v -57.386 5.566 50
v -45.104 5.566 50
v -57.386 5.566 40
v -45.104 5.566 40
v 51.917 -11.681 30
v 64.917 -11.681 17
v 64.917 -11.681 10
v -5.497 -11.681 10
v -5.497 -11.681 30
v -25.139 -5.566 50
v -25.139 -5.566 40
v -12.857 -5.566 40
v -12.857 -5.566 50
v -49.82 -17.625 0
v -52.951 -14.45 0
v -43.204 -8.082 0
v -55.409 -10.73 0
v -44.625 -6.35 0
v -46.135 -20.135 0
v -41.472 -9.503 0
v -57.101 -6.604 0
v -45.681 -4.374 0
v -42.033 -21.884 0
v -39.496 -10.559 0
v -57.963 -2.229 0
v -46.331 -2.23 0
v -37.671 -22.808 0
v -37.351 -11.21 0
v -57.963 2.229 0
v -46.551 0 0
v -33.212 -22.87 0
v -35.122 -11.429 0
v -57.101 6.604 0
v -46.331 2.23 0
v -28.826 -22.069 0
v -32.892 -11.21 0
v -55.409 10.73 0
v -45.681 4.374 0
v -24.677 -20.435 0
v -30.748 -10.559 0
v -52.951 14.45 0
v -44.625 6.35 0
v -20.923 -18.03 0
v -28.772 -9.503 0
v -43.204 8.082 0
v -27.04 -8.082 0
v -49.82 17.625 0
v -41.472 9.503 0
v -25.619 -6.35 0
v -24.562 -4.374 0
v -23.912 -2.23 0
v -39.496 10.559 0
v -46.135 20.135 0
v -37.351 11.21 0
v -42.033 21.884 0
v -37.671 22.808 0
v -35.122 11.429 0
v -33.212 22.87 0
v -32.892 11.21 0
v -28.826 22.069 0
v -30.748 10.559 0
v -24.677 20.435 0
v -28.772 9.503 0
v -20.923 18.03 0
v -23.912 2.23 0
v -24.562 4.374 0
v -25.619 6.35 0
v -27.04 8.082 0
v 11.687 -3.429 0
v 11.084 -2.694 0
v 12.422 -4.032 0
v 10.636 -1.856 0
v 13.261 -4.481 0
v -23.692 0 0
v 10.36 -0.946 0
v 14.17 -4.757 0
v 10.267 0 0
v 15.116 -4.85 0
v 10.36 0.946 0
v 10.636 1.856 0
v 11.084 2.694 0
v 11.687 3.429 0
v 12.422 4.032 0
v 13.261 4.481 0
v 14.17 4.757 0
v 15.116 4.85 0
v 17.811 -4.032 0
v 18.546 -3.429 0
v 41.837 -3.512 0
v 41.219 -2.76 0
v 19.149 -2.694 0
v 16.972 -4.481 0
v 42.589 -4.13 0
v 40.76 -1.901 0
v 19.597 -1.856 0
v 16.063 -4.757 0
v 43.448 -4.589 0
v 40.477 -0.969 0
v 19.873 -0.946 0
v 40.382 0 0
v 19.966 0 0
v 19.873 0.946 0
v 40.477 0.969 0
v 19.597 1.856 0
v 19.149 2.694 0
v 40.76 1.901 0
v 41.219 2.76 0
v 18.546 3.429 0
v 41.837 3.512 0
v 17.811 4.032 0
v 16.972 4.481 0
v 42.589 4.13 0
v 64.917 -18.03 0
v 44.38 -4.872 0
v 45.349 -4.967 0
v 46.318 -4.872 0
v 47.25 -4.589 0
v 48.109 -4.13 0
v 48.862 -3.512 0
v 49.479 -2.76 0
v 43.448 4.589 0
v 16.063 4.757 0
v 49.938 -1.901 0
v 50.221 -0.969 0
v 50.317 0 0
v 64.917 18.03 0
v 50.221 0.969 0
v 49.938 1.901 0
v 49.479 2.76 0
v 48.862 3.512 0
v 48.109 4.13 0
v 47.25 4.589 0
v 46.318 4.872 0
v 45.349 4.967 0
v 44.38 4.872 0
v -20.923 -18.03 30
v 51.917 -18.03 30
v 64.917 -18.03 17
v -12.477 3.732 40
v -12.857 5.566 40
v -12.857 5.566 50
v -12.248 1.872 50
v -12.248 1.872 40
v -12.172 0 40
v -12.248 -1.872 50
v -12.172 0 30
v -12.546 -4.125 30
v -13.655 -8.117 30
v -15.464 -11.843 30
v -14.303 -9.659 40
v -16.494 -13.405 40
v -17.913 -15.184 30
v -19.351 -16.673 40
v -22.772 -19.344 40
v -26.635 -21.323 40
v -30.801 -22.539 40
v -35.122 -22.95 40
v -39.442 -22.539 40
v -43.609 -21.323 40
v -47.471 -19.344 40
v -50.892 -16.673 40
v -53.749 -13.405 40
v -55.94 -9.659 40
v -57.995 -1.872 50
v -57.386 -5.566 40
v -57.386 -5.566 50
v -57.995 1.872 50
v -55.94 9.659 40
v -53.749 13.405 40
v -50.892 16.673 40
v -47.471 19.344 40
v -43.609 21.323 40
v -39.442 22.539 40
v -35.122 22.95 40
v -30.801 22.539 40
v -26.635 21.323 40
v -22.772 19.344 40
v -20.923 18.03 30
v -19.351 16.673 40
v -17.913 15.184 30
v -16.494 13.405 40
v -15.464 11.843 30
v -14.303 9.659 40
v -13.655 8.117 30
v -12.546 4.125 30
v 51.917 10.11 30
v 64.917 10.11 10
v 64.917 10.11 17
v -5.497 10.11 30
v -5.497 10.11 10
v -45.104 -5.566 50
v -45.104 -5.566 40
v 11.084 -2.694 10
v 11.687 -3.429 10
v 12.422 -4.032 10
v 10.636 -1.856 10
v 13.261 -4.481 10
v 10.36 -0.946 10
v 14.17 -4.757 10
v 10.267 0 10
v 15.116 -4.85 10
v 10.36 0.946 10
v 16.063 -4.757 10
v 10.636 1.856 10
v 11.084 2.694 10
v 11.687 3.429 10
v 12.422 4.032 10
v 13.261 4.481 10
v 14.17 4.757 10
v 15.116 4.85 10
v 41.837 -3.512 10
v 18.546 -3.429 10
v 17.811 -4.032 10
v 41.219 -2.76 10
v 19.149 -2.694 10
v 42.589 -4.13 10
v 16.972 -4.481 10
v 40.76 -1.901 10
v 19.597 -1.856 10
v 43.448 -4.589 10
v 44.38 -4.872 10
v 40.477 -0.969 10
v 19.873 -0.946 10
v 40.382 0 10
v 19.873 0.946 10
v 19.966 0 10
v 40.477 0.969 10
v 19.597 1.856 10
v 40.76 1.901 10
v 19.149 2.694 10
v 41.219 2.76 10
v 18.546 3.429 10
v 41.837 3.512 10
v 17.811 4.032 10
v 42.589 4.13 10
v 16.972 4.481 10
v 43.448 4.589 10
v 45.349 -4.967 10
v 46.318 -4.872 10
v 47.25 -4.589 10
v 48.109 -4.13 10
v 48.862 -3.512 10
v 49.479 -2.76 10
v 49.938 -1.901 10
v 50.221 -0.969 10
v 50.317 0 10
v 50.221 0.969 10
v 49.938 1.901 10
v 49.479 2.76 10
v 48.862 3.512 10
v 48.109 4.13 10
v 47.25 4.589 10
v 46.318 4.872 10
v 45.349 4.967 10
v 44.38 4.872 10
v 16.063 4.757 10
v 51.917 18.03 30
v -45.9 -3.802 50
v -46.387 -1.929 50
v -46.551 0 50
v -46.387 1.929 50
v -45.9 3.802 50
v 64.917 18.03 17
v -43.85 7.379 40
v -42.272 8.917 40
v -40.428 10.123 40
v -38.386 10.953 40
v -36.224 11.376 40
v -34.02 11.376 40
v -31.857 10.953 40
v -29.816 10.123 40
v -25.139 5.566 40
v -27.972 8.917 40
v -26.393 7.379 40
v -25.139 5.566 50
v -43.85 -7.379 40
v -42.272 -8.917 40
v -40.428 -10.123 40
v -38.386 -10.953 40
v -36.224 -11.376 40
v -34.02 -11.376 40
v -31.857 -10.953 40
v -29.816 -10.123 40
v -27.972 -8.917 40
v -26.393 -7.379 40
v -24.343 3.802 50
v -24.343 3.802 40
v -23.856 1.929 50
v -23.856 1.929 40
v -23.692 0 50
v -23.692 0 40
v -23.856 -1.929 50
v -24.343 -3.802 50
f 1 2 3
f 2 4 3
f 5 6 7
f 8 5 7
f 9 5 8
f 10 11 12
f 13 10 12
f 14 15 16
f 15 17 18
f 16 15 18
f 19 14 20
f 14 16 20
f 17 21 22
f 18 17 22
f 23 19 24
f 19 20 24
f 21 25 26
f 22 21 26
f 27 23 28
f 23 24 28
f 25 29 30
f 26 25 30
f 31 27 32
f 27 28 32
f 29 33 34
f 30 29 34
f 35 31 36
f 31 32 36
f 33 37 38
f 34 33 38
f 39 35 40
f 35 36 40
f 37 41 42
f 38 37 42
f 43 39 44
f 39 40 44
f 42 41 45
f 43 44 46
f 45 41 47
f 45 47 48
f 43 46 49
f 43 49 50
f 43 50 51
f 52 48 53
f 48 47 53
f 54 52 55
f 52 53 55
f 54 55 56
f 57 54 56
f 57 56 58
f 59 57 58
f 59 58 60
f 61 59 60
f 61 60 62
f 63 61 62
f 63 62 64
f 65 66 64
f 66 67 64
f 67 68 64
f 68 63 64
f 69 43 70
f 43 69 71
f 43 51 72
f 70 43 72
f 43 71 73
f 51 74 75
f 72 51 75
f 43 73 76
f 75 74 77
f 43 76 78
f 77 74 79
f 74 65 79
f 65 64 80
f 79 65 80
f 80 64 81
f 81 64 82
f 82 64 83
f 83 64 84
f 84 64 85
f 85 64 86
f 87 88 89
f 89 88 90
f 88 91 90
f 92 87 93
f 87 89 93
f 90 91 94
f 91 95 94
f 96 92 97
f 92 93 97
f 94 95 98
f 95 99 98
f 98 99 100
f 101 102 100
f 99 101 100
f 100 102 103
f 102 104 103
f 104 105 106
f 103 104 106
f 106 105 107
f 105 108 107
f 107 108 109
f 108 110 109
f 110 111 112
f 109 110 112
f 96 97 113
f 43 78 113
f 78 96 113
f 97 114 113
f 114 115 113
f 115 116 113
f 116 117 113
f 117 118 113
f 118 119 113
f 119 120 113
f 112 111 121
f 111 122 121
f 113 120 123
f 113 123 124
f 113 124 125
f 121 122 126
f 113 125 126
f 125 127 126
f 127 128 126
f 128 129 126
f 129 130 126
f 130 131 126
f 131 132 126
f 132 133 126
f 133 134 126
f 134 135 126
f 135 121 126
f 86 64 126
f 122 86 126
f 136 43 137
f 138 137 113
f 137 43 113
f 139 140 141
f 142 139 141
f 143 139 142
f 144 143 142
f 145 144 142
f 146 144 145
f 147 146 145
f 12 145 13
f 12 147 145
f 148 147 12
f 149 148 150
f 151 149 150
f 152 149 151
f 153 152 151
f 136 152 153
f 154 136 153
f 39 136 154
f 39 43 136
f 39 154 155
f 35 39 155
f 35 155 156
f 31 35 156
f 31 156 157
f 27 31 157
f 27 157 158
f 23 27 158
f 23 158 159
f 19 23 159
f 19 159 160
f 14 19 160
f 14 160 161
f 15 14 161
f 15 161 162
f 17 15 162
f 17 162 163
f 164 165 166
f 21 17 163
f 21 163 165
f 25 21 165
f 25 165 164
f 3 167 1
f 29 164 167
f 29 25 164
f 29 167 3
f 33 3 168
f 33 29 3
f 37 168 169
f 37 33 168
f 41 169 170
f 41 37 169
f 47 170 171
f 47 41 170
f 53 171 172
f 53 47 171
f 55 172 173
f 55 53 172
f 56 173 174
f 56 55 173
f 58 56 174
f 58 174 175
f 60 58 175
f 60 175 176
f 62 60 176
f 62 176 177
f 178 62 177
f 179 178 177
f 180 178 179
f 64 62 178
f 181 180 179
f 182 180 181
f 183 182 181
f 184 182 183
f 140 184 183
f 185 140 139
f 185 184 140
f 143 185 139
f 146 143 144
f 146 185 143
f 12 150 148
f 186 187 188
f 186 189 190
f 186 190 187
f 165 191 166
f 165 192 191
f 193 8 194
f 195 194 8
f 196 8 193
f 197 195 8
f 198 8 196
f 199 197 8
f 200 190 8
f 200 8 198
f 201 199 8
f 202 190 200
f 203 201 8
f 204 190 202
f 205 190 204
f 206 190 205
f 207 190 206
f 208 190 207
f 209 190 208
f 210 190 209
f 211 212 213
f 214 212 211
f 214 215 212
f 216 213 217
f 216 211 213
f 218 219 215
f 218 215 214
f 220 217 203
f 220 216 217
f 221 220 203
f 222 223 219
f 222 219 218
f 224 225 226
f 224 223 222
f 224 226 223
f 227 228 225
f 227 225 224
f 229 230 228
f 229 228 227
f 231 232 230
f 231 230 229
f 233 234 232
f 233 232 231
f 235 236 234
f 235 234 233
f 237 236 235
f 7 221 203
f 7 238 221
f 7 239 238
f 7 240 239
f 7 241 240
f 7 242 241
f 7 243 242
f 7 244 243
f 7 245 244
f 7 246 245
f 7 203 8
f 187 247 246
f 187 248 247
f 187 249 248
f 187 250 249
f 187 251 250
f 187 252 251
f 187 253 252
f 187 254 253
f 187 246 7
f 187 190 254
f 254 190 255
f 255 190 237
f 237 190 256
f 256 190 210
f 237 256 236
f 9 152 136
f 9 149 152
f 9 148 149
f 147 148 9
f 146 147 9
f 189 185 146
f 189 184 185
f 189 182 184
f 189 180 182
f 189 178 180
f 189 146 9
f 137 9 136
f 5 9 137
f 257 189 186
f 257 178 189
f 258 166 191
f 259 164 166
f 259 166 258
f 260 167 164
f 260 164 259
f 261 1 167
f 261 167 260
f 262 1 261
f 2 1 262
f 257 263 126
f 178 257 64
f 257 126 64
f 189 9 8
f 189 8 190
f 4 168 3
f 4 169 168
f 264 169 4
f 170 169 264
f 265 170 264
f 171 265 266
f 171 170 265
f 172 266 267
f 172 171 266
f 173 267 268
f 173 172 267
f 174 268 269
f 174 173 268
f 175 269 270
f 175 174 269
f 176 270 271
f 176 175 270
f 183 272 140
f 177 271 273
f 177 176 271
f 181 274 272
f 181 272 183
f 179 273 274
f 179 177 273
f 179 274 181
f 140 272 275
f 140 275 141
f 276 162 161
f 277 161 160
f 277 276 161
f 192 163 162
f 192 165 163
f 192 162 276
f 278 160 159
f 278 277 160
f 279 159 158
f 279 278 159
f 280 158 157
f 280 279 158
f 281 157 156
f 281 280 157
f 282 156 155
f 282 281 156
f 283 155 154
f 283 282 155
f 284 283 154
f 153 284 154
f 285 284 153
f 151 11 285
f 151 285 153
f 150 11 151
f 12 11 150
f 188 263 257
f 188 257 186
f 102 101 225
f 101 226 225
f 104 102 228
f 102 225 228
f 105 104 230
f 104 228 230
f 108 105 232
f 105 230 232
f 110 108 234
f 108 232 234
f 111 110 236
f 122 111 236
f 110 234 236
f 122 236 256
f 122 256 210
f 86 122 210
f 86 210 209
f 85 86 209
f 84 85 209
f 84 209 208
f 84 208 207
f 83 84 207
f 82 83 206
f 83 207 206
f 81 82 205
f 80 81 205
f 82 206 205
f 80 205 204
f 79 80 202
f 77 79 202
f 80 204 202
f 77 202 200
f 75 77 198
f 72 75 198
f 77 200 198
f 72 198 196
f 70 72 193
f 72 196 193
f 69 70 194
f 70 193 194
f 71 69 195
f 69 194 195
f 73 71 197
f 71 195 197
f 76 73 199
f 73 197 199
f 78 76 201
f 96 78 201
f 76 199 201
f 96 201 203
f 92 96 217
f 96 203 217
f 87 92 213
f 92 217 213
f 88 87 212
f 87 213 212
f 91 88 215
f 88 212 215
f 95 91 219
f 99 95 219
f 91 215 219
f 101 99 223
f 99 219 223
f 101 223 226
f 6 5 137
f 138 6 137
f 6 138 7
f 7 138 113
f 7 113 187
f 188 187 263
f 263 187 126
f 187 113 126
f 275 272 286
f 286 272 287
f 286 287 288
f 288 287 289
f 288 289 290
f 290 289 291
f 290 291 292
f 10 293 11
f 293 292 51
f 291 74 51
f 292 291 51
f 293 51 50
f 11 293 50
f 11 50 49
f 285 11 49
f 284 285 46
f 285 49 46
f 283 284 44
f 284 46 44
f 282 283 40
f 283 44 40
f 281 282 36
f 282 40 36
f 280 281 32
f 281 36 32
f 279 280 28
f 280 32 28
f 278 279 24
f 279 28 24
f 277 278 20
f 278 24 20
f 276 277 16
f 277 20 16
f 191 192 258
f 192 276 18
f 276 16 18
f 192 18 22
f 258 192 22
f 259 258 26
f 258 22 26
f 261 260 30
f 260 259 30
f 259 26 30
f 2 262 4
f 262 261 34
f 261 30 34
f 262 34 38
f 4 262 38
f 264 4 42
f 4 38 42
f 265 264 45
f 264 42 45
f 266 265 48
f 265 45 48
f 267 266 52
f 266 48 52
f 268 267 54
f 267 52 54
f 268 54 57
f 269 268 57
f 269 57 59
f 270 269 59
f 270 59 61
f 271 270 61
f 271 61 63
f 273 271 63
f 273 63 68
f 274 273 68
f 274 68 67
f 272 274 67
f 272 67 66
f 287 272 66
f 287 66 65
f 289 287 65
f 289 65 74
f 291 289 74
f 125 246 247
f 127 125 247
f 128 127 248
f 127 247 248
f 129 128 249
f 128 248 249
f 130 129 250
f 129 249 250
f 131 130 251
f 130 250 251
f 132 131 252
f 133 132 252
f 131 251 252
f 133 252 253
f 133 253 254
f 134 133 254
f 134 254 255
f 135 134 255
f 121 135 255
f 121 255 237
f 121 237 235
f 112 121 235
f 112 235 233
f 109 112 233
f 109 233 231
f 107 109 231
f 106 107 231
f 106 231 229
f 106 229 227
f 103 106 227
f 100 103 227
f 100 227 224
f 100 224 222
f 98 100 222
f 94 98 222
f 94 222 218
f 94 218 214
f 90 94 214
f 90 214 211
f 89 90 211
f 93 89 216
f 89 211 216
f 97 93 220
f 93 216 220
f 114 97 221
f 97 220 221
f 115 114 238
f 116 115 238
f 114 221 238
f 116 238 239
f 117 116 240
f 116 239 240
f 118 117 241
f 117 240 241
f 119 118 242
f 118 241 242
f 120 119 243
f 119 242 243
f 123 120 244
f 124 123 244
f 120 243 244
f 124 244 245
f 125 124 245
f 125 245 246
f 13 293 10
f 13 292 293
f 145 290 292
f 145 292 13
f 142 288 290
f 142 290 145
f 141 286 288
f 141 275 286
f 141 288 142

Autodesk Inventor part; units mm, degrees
ref_plane "YZ Plane" through (0, 0, 0) normal (1, 0, 0) x (0, 1, 0)
ref_plane "XZ Plane" through (0, 0, 0) normal (0, 1, 0) x (-1, 0, 0)
ref_plane "XY Plane" through (0, 0, 0) normal (0, 0, 1) x (1, 0, 0)
sketch "스케치1" plane through (0, 0, 0) normal (0, 0, 1) x (1, 0, 0)
  circle A0 centre (-35.1217, 0) radius 22.9499
  circle A1 centre (-35.1217, 0) radius 11.4294
  line L0 (-20.9226, -18.03) -> (64.9173, -18.03)
  line L1 (64.9173, -18.03) -> (64.9173, 18.03)
  line L2 (64.9173, 18.03) -> (-20.9226, 18.03)
  point P0 (0, 0)
extrude "돌출1" add sketch "스케치1" along normal blind 30 contours A0 L2 L1 L0
extrude "돌출2" add sketch "스케치1" along normal blind 40 contours A0
sketch "스케치2" plane through (-35.1217, 0, 40) normal (0, 0, 1) x (1, 0, 0)
  circle A0 centre (0, 0) radius 11.4294 projected
  line L0 (9.9823, 5.5664) -> (22.2646, 5.5664)
  circle A1 centre (0, 0) radius 22.9499 projected
  line L1 (9.9823, -5.5664) -> (22.2646, -5.5664)
  line L2 (-9.9823, 5.5664) -> (-22.2646, 5.5664)
  line L3 (-9.9823, -5.5664) -> (-22.2646, -5.5664)
  point P0 (35.1217, 0)
extrude "돌출3" add sketch "스케치2" along normal blind 10 contours A0 L0 A1 L1 | A0 L3 A1 L2
sketch "스케치3" plane through (0, 0, 30) normal (0, 0, 1) x (1, 0, 0)
  line L0 (64.9173, -18.03) -> (64.9173, 18.03) projected
  line L1 (-5.4969, 10.1103) -> (64.9173, 10.1103)
  line L2 (64.9173, 10.1103) -> (64.9173, -11.6809)
  line L3 (64.9173, -11.6809) -> (-5.4969, -11.6809)
  line L4 (-5.4969, -11.6809) -> (-5.4969, 10.1103)
  circle A0 centre (15.1164, 0) radius 4.8497
  circle A1 centre (45.3492, 0) radius 4.9674
  point P0 (0, 0)
extrude "돌출4" cut sketch "스케치3" against normal blind 50 contours A0 | A1
extrude "돌출5" cut sketch "스케치3" against normal blind 20
chamfer "모따기1" distance 13 angle 45 2 edges at (64.9173, 14.0702, 30) (64.9173, -14.8554, 30)
properties part number "240510_3Dsketch06"
